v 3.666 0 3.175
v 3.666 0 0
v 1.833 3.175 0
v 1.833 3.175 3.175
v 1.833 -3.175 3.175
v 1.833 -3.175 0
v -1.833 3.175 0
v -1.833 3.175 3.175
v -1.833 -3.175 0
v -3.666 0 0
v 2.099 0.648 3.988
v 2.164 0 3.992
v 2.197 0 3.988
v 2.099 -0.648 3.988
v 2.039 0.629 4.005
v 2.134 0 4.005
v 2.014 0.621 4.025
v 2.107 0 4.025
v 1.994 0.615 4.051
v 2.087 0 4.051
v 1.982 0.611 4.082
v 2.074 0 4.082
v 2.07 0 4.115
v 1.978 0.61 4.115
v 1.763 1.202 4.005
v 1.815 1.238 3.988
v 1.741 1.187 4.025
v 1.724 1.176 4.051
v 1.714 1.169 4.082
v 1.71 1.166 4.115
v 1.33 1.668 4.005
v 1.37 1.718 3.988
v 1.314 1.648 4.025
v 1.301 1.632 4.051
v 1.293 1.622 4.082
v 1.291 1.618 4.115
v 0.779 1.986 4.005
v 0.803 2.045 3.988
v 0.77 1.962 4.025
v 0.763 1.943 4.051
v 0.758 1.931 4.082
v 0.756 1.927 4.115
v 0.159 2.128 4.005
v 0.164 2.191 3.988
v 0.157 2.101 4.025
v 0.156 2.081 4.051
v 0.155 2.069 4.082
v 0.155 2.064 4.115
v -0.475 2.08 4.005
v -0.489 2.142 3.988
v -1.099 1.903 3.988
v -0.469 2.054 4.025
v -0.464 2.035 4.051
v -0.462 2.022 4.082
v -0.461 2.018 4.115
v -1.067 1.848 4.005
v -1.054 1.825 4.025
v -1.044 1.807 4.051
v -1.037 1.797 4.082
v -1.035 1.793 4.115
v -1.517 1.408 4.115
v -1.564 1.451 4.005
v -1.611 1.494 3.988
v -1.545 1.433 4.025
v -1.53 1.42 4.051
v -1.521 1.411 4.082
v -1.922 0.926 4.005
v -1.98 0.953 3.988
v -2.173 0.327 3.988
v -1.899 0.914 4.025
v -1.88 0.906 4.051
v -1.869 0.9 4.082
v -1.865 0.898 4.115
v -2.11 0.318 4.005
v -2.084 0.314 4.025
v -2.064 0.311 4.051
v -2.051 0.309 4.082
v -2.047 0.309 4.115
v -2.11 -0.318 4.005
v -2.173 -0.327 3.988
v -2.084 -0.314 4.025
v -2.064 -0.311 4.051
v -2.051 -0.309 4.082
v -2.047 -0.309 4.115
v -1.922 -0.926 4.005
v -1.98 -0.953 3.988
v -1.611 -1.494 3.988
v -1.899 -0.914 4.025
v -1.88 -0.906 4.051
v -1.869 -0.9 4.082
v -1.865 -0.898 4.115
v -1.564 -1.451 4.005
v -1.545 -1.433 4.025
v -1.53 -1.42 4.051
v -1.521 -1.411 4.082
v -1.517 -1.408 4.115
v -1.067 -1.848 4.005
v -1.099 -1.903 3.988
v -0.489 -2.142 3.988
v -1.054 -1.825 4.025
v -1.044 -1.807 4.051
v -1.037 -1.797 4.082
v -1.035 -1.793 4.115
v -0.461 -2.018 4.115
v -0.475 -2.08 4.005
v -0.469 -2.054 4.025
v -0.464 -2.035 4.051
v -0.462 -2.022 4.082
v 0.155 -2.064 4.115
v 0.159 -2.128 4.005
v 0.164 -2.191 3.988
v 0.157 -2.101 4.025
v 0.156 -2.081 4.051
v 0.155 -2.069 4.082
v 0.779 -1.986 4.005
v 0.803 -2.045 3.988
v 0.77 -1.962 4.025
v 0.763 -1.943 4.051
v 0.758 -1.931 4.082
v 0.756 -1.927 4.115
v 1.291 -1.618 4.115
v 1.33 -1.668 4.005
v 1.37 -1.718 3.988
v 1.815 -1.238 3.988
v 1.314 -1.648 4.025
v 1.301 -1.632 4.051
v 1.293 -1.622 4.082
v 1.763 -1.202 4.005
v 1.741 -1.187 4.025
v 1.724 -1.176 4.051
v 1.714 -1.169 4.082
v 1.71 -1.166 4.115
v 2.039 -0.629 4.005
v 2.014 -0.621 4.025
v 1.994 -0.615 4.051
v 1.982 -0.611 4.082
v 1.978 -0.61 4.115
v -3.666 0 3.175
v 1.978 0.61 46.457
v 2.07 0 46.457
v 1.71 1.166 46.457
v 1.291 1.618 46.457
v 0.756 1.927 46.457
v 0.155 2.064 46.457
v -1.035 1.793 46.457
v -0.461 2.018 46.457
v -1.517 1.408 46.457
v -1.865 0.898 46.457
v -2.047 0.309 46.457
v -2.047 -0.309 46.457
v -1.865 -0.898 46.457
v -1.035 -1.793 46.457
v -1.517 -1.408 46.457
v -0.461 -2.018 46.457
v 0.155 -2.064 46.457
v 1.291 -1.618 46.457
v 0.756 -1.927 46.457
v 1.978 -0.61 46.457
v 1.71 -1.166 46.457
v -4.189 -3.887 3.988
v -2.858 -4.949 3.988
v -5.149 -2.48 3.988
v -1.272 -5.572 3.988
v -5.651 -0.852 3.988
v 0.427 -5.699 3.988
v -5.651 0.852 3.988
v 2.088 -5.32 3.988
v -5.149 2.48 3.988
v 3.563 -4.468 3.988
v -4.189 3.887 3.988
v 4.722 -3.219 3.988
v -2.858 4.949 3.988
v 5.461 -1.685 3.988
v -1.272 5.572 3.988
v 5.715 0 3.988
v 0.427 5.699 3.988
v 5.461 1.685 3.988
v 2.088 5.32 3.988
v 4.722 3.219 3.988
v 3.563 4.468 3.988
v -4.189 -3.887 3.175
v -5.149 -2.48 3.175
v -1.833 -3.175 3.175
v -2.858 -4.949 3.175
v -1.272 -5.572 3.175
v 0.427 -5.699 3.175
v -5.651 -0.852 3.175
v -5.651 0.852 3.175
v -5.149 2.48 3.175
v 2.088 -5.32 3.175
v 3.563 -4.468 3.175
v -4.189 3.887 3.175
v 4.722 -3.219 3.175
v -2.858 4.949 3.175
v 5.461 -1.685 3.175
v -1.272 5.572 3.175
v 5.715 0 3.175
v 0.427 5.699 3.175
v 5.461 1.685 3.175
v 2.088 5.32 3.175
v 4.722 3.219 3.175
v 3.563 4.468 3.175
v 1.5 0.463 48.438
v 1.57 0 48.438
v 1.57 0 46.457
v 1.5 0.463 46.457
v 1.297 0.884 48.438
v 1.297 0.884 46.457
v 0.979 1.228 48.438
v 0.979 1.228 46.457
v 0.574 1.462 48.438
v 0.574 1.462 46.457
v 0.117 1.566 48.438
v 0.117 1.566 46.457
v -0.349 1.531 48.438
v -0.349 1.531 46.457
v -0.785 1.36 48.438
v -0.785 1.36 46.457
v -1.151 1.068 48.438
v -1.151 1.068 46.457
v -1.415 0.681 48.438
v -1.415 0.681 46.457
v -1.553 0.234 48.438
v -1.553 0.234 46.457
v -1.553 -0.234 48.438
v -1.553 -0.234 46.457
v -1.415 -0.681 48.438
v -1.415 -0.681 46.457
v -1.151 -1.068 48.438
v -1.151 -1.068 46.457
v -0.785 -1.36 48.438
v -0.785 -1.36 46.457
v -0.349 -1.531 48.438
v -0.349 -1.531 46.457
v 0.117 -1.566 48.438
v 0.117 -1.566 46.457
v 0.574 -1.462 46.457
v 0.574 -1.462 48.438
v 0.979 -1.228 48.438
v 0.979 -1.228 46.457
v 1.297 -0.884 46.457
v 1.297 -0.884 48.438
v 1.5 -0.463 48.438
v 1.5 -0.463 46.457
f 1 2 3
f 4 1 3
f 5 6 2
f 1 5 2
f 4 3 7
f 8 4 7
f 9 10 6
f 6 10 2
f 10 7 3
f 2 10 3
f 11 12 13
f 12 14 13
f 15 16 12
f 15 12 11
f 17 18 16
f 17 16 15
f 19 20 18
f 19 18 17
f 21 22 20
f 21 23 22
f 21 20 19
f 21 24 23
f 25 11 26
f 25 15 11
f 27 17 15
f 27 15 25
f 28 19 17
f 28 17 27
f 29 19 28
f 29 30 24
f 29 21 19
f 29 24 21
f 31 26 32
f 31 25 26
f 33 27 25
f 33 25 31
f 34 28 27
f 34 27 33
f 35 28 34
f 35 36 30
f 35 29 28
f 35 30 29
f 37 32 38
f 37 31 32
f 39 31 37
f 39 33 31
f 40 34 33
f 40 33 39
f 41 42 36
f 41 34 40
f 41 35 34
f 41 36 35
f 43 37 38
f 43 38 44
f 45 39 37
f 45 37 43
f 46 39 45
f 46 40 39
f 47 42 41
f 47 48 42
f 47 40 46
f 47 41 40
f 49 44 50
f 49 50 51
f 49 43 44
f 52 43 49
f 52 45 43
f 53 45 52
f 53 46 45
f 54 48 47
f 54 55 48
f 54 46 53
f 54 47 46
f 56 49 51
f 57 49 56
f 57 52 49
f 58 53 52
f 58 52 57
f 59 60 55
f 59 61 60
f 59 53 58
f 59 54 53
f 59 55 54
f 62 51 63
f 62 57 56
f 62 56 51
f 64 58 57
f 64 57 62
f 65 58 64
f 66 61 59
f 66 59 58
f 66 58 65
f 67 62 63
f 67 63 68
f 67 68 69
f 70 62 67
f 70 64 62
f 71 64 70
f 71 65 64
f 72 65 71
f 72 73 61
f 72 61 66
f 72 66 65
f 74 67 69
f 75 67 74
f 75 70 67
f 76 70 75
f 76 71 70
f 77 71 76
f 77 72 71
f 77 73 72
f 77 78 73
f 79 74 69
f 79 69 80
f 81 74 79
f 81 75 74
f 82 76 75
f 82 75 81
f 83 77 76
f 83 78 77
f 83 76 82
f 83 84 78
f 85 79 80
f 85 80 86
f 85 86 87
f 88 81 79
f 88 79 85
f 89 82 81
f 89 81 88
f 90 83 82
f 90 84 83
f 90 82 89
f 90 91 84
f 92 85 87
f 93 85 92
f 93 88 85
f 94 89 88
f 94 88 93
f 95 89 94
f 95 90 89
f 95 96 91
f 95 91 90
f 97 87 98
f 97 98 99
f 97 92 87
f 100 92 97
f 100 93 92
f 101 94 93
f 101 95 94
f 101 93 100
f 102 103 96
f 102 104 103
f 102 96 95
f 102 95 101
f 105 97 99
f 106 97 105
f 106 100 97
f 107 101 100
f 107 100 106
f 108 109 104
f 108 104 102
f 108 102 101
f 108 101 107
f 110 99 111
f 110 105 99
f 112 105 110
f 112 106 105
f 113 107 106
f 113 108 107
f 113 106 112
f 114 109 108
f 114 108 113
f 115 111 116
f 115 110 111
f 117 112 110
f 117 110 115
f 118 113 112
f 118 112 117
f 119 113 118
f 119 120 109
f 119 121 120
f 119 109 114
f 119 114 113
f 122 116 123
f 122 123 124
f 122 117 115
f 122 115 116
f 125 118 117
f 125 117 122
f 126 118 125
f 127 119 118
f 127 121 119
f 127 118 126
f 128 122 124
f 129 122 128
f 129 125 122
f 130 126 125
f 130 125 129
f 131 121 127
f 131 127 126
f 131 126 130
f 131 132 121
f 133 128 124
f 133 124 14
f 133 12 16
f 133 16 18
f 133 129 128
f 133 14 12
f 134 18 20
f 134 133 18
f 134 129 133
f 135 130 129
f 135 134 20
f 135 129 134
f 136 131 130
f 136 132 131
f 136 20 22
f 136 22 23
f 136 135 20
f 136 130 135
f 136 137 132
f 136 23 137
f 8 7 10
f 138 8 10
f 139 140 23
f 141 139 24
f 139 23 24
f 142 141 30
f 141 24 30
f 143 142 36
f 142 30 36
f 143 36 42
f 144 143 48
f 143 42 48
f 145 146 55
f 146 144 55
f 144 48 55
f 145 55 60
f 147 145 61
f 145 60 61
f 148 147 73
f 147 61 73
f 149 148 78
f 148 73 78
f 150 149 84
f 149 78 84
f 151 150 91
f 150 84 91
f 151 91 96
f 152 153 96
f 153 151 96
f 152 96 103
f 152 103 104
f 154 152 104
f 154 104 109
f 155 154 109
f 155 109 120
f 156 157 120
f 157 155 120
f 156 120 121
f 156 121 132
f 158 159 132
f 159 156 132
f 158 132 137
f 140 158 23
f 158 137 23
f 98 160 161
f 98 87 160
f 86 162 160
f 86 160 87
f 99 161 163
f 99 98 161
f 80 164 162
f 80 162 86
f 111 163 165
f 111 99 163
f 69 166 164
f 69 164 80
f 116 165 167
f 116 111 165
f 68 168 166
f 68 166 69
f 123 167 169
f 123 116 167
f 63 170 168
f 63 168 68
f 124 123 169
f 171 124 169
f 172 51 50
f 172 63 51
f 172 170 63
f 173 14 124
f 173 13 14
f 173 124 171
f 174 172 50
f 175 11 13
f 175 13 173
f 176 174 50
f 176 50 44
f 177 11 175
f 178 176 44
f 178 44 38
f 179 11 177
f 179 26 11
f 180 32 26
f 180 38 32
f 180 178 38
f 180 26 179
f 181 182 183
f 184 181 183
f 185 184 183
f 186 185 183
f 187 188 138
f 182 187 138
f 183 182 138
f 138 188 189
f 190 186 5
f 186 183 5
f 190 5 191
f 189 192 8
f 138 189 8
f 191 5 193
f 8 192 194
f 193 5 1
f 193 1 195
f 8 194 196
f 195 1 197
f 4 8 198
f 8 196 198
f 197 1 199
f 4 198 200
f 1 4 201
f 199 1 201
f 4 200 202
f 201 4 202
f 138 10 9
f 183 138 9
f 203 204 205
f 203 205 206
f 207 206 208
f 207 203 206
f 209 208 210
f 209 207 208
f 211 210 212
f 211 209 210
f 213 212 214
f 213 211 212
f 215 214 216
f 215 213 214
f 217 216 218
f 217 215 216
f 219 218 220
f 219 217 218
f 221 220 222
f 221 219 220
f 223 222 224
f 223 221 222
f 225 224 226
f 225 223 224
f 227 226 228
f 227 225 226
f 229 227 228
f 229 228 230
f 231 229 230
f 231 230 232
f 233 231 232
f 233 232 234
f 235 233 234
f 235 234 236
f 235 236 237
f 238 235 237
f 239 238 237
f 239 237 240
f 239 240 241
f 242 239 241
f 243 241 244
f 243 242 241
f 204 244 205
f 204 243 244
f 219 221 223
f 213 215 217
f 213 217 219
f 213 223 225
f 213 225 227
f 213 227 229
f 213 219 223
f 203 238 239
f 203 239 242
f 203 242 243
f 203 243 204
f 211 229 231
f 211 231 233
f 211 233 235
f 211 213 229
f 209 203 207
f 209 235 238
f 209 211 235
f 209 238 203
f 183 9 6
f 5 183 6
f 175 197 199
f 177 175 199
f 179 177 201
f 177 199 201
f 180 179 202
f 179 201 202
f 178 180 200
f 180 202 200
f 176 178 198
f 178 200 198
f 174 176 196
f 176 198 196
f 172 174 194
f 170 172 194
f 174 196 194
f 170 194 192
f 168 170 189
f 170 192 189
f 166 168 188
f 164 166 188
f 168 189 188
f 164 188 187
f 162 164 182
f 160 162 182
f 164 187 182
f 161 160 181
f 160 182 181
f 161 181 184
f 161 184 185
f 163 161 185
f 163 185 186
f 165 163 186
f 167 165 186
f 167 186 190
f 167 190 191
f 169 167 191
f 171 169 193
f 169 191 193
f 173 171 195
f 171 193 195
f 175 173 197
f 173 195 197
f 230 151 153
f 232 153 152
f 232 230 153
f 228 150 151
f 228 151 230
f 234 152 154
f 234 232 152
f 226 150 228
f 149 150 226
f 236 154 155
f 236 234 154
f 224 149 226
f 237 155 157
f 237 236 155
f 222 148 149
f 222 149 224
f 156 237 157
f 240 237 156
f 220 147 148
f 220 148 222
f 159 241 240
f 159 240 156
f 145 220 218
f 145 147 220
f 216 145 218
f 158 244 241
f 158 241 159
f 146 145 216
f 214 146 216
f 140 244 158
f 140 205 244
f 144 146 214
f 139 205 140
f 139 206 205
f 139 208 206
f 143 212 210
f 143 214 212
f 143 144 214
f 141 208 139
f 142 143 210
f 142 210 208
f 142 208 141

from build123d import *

# Parameters (mm, degrees)
BOSS_EXTRUDE1_DEPTH = 3.175
SKETCH2_R           = 5.715
BOSS_EXTRUDE2_DEPTH = 0.8128
SKETCH3_R           = 2.0701
BOSS_EXTRUDE3_DEPTH = 44.45
FILLET1_R           = 0.127
SKETCH4_OUTSIDE_W   = 23.642
SKETCH4_OUTSIDE_H   = 23.642
SKETCH4_OUTSIDE_R   = 1.5701
CUT_EXTRUDE1_DEPTH  = 1.9812


with BuildPart() as part:
    # Sketch1 → Boss-Extrude1 (new body)
    with BuildSketch(Plane.XY):
        Polygon((3.666174209, 0), (1.833087105, 3.175), (-1.833087105, 3.175), (-3.666174209, 0), (-1.833087105, -3.175), (1.833087105, -3.175), align=None)
    extrude(amount=BOSS_EXTRUDE1_DEPTH)

    # Sketch2 → Boss-Extrude2 (add)
    with BuildSketch(Plane.XY.offset(3.175)):
        Circle(SKETCH2_R)
    extrude(amount=BOSS_EXTRUDE2_DEPTH)

    # Sketch3 → Boss-Extrude3 (add)
    with BuildSketch(Plane.XY.offset(3.9878)):
        Circle(SKETCH3_R)
    extrude(amount=BOSS_EXTRUDE3_DEPTH)

    # Fillet1
    fillet1_edges = [part.edges().sort_by_distance(p)[0] for p in [
        (-2.0701, 0, 3.9878),
    ]]
    fillet(fillet1_edges, radius=FILLET1_R)

    # Sketch4 outside → Cut-Extrude1 (cut)
    with BuildSketch(Plane.XY.offset(48.4378)):
        Rectangle(SKETCH4_OUTSIDE_W, SKETCH4_OUTSIDE_H)
        Circle(SKETCH4_OUTSIDE_R, mode=Mode.SUBTRACT)
    extrude(amount=-CUT_EXTRUDE1_DEPTH, mode=Mode.SUBTRACT)


solid = part.part
